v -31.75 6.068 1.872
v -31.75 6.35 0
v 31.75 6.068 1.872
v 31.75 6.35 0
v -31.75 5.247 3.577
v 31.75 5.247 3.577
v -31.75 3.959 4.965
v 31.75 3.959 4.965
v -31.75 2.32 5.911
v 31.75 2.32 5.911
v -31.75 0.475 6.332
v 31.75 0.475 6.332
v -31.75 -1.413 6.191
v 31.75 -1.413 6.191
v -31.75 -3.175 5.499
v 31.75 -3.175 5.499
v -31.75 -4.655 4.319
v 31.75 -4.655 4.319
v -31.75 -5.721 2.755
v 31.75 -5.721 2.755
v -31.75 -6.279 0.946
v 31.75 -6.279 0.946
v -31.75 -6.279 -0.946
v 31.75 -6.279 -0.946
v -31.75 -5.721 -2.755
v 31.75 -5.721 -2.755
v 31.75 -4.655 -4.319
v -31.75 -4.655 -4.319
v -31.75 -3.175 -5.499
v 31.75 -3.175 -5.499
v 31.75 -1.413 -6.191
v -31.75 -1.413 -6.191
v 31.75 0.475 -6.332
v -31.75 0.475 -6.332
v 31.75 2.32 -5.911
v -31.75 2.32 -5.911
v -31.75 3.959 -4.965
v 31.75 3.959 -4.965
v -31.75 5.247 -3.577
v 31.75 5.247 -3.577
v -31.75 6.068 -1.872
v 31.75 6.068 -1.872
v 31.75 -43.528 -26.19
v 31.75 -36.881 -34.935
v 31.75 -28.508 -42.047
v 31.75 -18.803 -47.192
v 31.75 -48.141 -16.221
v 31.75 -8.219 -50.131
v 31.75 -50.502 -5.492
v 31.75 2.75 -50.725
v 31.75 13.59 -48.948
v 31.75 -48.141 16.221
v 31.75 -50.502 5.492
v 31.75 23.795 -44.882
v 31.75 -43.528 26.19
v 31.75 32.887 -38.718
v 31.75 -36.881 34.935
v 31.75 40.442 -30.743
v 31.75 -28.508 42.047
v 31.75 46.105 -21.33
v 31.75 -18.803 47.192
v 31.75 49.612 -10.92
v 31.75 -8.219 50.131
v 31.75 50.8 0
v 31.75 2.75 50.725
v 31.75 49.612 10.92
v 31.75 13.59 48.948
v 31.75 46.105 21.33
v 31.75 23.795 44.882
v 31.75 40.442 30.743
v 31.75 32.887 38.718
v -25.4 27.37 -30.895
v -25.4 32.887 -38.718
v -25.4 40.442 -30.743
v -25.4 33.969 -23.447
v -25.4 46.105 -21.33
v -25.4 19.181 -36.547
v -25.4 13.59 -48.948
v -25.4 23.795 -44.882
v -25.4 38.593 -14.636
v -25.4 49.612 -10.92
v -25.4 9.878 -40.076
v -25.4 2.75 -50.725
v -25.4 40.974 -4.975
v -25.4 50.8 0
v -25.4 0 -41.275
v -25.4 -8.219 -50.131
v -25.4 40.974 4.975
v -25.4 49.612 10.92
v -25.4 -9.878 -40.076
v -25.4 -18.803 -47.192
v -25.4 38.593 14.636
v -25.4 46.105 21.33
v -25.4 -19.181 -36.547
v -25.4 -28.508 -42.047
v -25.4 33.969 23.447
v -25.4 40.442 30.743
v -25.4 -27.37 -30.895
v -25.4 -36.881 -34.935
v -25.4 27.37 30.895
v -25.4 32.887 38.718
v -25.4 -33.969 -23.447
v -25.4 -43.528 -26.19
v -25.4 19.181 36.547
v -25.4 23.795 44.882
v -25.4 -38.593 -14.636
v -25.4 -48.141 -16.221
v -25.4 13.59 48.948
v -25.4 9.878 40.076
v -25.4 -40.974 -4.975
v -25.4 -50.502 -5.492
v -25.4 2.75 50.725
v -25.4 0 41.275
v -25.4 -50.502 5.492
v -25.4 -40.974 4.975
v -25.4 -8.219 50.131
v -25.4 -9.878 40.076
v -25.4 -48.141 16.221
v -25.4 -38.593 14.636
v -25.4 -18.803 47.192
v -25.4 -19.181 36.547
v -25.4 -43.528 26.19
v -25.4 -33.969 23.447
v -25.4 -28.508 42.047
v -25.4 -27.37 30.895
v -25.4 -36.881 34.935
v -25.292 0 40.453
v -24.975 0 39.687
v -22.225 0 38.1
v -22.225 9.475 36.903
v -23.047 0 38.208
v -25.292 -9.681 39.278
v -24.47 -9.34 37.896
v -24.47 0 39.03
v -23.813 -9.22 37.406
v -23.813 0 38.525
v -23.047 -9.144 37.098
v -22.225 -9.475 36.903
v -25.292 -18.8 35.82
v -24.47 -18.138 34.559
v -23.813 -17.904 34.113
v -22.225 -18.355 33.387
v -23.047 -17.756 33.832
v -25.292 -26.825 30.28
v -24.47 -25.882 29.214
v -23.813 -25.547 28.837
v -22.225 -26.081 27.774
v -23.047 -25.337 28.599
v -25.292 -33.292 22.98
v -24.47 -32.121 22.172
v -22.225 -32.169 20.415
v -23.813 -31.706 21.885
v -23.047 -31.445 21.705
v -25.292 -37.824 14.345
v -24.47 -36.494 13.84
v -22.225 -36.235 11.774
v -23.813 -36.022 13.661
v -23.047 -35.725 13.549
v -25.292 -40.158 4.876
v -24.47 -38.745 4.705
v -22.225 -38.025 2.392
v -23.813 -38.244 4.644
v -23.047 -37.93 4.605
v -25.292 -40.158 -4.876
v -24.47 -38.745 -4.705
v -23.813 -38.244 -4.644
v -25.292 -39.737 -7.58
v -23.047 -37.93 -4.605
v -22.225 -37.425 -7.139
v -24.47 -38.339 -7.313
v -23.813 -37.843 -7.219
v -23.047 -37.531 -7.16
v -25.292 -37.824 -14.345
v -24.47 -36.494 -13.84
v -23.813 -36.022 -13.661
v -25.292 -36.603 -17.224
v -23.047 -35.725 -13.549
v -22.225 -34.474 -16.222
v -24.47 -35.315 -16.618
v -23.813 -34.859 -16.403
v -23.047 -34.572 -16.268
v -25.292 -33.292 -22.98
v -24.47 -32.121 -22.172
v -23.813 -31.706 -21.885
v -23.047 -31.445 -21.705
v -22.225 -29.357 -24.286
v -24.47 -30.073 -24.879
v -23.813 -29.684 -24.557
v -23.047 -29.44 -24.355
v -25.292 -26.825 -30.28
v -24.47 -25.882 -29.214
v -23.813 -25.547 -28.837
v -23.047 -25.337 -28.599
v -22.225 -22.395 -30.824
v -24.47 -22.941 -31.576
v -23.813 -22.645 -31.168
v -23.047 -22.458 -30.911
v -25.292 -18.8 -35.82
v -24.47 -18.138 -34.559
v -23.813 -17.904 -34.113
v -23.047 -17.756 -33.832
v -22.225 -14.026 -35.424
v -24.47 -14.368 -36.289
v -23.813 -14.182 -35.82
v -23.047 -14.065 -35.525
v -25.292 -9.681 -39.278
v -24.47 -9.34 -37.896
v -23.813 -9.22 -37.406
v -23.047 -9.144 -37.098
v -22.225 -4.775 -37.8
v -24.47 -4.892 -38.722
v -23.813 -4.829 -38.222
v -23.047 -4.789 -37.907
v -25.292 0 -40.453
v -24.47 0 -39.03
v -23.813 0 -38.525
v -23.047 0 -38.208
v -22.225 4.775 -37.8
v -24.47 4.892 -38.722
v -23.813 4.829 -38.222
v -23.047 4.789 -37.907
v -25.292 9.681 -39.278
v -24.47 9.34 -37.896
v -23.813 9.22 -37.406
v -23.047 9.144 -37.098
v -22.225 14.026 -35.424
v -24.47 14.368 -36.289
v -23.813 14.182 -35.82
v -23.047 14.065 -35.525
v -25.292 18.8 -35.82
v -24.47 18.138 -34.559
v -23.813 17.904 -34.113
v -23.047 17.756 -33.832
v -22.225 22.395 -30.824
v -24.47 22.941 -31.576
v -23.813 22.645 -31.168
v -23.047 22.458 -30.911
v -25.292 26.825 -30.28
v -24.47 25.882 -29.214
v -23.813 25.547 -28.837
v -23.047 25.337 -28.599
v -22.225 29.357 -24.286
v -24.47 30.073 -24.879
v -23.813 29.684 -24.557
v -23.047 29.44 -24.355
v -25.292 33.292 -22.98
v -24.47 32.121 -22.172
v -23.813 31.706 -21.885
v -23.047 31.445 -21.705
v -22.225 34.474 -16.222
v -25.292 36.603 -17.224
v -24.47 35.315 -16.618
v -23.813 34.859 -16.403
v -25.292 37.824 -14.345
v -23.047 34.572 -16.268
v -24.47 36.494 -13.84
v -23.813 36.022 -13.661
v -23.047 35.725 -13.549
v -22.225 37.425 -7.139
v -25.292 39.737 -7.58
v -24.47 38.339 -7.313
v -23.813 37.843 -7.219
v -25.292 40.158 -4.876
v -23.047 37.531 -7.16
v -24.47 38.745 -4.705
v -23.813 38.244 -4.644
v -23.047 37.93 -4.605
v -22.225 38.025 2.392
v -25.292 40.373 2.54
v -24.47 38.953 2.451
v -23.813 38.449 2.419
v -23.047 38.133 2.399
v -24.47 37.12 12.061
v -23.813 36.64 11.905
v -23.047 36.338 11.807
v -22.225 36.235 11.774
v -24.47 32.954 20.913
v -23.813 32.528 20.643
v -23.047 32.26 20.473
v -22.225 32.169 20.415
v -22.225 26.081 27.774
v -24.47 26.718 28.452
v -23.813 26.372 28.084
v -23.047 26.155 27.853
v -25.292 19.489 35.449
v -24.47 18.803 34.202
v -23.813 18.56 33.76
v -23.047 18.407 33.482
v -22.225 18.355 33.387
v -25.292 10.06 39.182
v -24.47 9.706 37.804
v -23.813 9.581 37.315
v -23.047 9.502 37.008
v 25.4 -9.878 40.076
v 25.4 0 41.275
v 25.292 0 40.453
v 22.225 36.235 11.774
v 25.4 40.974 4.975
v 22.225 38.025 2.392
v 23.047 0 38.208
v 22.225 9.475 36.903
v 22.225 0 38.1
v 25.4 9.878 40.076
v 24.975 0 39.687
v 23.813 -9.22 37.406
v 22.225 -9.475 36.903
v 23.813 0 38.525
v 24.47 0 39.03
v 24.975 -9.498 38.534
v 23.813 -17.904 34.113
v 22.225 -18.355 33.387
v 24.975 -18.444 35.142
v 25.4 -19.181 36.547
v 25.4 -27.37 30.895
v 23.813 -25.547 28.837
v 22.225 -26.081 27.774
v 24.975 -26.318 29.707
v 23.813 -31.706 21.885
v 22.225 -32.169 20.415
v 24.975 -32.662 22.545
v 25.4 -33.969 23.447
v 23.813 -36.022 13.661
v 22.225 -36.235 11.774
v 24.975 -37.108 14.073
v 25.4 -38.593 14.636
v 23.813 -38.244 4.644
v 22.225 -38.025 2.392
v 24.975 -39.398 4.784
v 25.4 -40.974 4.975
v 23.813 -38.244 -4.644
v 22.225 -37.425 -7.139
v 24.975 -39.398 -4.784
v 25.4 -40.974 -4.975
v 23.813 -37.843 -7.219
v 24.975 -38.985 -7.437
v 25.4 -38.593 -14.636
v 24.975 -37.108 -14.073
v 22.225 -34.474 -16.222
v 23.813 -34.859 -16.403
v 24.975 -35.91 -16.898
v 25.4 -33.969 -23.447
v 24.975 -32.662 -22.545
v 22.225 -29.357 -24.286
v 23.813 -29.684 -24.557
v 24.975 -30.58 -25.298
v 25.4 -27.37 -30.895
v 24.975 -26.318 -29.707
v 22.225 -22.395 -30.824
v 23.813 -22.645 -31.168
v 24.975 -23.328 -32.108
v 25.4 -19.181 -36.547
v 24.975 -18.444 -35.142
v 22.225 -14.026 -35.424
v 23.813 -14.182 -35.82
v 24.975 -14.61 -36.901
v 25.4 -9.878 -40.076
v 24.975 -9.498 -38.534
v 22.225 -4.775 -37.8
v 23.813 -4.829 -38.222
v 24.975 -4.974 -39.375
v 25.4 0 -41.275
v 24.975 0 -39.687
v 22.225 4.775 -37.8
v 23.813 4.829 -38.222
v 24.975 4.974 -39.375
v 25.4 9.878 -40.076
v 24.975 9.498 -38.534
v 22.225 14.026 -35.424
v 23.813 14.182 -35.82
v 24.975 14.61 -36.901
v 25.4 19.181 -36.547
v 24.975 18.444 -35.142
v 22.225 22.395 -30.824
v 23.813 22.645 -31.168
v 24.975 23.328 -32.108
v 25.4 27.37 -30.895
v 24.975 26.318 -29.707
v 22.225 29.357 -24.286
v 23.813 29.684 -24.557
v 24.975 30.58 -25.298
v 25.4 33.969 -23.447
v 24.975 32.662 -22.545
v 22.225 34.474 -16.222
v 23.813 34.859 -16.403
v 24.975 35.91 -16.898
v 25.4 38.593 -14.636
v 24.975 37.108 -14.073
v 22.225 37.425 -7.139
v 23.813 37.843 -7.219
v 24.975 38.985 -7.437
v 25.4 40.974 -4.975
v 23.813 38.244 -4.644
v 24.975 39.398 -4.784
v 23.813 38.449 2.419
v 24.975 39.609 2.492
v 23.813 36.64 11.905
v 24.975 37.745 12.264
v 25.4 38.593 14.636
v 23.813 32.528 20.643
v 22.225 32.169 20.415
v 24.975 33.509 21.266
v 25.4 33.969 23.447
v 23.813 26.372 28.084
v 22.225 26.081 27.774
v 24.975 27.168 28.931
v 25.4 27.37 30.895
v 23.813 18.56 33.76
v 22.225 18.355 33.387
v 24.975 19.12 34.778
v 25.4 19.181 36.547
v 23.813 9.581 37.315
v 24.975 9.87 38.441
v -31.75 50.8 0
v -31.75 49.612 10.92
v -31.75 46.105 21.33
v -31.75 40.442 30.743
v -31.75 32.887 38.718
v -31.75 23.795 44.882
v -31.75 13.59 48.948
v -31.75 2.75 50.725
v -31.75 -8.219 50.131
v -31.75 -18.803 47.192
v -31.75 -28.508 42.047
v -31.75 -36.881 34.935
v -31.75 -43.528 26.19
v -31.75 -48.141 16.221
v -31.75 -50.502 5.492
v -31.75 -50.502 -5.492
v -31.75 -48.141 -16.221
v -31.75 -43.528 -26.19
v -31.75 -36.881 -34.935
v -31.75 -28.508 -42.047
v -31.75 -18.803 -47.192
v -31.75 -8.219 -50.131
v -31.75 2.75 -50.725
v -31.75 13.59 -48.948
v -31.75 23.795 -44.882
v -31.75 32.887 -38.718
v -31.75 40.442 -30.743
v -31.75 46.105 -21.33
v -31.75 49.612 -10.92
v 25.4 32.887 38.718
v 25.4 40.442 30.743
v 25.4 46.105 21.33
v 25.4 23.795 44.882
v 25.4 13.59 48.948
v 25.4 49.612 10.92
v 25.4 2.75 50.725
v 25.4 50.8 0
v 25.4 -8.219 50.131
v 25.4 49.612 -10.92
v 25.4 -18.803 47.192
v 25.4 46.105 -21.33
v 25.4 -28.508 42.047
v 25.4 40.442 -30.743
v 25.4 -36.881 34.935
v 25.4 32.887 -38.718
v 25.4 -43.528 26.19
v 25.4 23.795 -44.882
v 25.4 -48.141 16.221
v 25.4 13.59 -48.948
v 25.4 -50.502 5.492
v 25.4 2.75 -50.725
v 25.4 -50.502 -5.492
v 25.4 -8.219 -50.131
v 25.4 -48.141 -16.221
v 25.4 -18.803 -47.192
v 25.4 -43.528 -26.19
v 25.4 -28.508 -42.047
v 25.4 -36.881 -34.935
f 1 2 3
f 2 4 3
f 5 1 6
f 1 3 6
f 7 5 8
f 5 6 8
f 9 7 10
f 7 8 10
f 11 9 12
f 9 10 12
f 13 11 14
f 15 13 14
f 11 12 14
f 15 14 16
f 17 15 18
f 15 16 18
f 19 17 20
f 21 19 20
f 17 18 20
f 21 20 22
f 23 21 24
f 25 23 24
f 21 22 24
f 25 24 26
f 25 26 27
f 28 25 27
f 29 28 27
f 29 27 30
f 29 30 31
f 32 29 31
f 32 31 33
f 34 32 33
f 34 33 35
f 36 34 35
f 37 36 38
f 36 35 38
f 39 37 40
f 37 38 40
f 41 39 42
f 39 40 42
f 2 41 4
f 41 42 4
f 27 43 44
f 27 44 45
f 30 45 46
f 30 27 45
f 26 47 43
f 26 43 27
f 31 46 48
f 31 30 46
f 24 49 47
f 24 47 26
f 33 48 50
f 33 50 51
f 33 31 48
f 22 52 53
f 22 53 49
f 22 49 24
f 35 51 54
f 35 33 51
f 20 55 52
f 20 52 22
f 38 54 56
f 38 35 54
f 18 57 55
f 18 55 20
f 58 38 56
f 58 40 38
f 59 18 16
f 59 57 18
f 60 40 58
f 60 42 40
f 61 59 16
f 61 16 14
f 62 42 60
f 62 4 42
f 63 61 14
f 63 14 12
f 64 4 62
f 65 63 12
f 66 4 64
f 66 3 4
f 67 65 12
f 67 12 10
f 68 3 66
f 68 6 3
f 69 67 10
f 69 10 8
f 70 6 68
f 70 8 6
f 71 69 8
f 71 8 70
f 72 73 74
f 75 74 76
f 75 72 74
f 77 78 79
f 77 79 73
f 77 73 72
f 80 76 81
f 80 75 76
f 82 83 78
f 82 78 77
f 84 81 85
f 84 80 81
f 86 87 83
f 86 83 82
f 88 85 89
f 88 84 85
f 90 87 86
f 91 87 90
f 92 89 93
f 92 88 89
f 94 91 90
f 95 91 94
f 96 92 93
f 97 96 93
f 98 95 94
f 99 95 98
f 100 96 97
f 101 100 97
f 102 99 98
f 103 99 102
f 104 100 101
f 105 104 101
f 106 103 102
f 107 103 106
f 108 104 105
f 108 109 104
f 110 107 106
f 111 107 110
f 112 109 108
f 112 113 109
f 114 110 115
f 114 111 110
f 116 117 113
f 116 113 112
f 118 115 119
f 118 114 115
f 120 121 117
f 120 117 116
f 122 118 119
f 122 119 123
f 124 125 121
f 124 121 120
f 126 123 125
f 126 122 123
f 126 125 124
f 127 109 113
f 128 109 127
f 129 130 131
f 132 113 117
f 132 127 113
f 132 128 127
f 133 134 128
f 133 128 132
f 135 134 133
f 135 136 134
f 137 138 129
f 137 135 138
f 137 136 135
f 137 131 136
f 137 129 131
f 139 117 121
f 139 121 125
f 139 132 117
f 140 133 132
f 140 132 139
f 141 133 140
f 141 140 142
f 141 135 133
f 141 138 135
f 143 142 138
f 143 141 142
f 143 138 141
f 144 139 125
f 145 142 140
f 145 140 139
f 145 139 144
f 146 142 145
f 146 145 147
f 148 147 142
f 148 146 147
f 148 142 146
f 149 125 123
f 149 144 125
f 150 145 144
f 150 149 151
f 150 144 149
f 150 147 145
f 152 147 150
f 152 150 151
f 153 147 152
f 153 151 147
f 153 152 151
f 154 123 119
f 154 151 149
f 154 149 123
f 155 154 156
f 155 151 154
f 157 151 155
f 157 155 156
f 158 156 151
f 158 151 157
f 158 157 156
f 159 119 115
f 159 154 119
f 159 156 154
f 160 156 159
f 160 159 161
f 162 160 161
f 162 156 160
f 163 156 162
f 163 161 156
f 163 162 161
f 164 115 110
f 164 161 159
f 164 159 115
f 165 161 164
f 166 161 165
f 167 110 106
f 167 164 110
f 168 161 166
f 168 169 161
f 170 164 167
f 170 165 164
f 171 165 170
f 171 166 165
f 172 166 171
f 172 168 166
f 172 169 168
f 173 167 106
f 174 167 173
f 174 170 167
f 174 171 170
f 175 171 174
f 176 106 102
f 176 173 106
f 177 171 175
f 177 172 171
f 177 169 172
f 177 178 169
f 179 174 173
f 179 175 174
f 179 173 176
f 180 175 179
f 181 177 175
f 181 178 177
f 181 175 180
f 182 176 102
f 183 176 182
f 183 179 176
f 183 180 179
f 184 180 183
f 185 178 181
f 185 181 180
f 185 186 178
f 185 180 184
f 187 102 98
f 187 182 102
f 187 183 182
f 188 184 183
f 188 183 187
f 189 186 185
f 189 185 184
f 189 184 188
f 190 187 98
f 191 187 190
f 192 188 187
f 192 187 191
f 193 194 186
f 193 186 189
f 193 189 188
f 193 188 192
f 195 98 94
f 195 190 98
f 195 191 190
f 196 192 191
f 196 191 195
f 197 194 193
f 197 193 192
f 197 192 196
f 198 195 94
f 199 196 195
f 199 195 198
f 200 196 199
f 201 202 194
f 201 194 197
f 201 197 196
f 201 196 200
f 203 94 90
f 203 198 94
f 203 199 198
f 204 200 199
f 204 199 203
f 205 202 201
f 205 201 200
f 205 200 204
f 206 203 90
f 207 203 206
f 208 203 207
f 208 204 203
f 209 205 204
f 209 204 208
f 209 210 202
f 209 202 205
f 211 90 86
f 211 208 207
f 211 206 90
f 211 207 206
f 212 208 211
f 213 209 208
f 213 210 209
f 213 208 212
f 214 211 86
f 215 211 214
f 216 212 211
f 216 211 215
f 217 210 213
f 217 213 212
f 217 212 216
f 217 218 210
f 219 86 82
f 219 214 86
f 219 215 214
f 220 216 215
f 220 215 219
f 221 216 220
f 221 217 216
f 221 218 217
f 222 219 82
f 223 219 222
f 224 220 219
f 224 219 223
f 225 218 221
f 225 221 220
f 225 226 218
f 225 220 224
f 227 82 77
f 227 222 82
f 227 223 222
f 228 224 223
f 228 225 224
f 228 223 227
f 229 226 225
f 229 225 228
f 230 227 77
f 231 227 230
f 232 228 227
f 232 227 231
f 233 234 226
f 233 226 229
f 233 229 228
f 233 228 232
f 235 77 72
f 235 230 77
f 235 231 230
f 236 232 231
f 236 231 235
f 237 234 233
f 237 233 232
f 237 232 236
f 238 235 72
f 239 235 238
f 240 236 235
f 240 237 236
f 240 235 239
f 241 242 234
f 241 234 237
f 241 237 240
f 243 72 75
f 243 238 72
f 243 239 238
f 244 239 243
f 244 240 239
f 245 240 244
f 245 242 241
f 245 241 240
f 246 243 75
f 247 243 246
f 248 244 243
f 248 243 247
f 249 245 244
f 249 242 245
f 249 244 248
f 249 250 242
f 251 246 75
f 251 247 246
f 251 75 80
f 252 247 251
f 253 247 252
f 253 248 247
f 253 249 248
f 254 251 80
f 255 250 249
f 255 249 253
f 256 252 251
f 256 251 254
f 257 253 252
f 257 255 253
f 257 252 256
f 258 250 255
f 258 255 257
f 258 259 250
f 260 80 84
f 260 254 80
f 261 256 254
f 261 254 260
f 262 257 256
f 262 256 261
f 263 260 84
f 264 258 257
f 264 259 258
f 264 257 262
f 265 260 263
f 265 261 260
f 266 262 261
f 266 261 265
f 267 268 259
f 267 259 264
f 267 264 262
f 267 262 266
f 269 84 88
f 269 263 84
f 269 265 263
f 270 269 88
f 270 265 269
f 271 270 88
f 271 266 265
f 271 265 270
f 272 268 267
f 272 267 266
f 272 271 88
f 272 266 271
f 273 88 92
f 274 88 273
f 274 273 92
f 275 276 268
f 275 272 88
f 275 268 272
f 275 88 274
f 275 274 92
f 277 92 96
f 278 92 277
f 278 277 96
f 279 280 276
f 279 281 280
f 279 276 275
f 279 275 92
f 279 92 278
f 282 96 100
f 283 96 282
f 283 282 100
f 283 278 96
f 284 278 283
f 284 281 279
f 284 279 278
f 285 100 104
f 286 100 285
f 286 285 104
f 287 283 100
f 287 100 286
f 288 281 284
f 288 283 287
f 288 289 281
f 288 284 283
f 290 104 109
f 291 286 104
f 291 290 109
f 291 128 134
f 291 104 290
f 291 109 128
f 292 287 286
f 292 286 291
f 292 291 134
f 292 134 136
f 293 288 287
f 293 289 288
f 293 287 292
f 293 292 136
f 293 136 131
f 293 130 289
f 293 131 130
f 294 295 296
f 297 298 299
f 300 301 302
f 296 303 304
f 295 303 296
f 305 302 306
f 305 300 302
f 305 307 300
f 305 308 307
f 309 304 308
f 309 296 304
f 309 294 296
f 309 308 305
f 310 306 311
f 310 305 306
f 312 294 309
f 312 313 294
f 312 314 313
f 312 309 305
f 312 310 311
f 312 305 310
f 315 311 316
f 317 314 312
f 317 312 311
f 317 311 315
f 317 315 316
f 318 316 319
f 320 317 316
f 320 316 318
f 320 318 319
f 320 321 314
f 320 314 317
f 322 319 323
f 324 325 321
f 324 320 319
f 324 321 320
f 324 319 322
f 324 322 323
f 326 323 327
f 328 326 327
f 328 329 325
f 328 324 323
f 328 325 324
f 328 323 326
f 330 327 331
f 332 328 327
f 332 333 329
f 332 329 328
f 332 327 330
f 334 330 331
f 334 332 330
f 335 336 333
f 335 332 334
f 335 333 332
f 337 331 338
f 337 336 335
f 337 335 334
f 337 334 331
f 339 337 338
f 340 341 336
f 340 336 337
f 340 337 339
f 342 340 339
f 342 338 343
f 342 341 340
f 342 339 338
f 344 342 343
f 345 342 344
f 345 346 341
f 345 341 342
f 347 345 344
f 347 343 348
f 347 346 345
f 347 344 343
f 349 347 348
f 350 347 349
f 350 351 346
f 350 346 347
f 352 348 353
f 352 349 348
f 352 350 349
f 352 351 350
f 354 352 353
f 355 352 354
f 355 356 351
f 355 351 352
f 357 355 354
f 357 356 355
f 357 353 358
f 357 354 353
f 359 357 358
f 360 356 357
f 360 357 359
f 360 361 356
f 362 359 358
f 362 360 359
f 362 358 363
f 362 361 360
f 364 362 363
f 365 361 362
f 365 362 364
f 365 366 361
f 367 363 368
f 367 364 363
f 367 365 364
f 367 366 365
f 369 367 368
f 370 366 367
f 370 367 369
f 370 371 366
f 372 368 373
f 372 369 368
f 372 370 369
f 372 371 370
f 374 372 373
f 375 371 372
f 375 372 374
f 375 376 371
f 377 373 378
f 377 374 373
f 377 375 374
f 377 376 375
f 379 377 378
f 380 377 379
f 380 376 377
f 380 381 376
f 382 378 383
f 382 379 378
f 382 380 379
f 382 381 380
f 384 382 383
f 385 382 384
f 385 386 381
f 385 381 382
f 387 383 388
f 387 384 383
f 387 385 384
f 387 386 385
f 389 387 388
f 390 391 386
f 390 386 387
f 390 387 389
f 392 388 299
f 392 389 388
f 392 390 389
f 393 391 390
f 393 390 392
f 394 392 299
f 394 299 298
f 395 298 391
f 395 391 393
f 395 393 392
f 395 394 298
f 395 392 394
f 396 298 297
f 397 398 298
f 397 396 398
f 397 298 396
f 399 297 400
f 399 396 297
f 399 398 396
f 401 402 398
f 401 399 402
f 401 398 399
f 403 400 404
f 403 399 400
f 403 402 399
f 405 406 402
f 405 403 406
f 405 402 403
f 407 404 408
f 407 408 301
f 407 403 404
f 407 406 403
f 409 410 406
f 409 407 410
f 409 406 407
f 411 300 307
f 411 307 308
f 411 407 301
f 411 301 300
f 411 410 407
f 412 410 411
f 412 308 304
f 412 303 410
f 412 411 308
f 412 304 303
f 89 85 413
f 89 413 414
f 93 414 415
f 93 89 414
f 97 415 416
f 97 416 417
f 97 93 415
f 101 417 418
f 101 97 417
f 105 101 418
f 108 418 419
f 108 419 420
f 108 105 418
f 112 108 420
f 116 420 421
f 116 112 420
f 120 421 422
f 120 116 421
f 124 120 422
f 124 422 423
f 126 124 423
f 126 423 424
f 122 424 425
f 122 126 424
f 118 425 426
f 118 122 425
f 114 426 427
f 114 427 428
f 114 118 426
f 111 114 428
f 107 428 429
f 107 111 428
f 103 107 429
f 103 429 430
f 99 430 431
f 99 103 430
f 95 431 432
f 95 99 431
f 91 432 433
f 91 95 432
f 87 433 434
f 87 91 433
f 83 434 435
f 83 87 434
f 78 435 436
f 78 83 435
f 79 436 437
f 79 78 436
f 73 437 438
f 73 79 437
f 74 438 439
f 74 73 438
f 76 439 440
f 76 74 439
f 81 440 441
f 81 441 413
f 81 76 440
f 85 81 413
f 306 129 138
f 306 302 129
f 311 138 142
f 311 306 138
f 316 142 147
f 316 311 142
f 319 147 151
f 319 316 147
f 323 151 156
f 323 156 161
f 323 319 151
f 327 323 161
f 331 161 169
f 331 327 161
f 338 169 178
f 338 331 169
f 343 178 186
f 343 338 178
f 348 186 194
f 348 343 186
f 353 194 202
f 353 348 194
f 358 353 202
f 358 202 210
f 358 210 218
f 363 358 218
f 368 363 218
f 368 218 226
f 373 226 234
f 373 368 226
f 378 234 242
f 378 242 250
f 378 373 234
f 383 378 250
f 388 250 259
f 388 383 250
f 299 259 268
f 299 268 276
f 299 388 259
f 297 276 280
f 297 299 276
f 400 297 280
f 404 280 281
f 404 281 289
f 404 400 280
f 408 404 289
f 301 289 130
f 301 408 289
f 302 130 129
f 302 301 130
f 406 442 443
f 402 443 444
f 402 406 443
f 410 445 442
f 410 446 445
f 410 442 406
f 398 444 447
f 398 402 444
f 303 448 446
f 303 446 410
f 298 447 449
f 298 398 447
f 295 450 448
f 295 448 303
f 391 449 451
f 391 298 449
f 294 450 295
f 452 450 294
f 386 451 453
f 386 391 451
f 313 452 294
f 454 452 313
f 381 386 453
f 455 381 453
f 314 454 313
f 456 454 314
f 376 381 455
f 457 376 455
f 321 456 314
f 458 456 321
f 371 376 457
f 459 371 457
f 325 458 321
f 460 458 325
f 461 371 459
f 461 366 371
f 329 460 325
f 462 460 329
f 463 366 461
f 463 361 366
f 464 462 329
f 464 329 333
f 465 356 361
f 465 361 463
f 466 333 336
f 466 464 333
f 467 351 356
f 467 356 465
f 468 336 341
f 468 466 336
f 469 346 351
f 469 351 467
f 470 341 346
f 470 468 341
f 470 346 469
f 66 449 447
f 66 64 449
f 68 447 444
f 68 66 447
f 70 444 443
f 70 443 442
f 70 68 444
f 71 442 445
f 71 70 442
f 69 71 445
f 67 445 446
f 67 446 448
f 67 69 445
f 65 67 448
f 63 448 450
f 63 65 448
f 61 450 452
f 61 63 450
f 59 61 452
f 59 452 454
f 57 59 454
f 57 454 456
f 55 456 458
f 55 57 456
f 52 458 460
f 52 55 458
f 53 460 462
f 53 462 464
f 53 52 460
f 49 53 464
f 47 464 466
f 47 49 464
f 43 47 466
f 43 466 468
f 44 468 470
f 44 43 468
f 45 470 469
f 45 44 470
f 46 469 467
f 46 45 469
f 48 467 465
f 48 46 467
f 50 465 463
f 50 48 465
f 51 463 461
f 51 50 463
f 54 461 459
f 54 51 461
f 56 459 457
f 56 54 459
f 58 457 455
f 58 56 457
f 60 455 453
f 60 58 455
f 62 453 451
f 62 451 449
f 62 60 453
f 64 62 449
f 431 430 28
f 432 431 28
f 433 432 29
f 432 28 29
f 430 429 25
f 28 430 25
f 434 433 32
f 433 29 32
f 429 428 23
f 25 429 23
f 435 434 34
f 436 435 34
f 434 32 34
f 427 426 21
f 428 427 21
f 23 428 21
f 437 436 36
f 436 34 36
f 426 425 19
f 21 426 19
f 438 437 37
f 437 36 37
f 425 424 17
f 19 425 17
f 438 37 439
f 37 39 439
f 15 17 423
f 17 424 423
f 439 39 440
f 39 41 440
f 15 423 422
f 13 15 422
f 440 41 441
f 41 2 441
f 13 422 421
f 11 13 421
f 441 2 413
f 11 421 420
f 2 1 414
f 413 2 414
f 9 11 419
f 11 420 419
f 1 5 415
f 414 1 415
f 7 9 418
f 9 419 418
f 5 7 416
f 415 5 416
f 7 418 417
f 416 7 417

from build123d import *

# Parameters (mm, degrees)
F0_R          = 50.8
F1_DEPTH      = 31.75
F4_R          = 6.35
F5_DEPTH      = 31.751
F5_DEPTH_BACK = 31.751


with BuildPart() as f1:
    # F0 (on Right) → F1 (new body, symmetric)
    with BuildSketch(Plane.YZ):
        Circle(F0_R)
    extrude(amount=F1_DEPTH, both=True)

    # F2 (on Front) → F3 (revolve, cut)
    with BuildSketch(Plane.XZ):
        with BuildLine():
            ThreePointArc((25.4, 74.3732936617), (24.4700640303, 76.618357692), (22.225, 77.5482936617))
            Line((22.225, 77.5482936617), (-22.225, 77.5482936617))
            ThreePointArc((-22.225, 77.5482936617), (-24.4700640303, 76.618357692), (-25.4, 74.3732936617))
            Line((-25.4, 74.3732936617), (-25.4, 41.275))
            ThreePointArc((-25.4, 41.275), (-24.4700640303, 39.0299359697), (-22.225, 38.1))
            Line((-22.225, 38.1), (22.225, 38.1))
            ThreePointArc((22.225, 38.1), (24.4700640303, 39.0299359697), (25.4, 41.275))
            Line((25.4, 41.275), (25.4, 74.3732936617))
        make_face()
    revolve(axis=Axis((0, 0, 0), (1, 0, 0)), mode=Mode.SUBTRACT)

    # F4 (on Right) → F5 (cut, two sides)
    with BuildSketch(Plane.YZ) as f5_sk:
        Circle(F4_R)
    extrude(amount=-F5_DEPTH, mode=Mode.SUBTRACT)
    extrude(f5_sk.sketch, amount=F5_DEPTH_BACK, mode=Mode.SUBTRACT)


solid = f1.part
